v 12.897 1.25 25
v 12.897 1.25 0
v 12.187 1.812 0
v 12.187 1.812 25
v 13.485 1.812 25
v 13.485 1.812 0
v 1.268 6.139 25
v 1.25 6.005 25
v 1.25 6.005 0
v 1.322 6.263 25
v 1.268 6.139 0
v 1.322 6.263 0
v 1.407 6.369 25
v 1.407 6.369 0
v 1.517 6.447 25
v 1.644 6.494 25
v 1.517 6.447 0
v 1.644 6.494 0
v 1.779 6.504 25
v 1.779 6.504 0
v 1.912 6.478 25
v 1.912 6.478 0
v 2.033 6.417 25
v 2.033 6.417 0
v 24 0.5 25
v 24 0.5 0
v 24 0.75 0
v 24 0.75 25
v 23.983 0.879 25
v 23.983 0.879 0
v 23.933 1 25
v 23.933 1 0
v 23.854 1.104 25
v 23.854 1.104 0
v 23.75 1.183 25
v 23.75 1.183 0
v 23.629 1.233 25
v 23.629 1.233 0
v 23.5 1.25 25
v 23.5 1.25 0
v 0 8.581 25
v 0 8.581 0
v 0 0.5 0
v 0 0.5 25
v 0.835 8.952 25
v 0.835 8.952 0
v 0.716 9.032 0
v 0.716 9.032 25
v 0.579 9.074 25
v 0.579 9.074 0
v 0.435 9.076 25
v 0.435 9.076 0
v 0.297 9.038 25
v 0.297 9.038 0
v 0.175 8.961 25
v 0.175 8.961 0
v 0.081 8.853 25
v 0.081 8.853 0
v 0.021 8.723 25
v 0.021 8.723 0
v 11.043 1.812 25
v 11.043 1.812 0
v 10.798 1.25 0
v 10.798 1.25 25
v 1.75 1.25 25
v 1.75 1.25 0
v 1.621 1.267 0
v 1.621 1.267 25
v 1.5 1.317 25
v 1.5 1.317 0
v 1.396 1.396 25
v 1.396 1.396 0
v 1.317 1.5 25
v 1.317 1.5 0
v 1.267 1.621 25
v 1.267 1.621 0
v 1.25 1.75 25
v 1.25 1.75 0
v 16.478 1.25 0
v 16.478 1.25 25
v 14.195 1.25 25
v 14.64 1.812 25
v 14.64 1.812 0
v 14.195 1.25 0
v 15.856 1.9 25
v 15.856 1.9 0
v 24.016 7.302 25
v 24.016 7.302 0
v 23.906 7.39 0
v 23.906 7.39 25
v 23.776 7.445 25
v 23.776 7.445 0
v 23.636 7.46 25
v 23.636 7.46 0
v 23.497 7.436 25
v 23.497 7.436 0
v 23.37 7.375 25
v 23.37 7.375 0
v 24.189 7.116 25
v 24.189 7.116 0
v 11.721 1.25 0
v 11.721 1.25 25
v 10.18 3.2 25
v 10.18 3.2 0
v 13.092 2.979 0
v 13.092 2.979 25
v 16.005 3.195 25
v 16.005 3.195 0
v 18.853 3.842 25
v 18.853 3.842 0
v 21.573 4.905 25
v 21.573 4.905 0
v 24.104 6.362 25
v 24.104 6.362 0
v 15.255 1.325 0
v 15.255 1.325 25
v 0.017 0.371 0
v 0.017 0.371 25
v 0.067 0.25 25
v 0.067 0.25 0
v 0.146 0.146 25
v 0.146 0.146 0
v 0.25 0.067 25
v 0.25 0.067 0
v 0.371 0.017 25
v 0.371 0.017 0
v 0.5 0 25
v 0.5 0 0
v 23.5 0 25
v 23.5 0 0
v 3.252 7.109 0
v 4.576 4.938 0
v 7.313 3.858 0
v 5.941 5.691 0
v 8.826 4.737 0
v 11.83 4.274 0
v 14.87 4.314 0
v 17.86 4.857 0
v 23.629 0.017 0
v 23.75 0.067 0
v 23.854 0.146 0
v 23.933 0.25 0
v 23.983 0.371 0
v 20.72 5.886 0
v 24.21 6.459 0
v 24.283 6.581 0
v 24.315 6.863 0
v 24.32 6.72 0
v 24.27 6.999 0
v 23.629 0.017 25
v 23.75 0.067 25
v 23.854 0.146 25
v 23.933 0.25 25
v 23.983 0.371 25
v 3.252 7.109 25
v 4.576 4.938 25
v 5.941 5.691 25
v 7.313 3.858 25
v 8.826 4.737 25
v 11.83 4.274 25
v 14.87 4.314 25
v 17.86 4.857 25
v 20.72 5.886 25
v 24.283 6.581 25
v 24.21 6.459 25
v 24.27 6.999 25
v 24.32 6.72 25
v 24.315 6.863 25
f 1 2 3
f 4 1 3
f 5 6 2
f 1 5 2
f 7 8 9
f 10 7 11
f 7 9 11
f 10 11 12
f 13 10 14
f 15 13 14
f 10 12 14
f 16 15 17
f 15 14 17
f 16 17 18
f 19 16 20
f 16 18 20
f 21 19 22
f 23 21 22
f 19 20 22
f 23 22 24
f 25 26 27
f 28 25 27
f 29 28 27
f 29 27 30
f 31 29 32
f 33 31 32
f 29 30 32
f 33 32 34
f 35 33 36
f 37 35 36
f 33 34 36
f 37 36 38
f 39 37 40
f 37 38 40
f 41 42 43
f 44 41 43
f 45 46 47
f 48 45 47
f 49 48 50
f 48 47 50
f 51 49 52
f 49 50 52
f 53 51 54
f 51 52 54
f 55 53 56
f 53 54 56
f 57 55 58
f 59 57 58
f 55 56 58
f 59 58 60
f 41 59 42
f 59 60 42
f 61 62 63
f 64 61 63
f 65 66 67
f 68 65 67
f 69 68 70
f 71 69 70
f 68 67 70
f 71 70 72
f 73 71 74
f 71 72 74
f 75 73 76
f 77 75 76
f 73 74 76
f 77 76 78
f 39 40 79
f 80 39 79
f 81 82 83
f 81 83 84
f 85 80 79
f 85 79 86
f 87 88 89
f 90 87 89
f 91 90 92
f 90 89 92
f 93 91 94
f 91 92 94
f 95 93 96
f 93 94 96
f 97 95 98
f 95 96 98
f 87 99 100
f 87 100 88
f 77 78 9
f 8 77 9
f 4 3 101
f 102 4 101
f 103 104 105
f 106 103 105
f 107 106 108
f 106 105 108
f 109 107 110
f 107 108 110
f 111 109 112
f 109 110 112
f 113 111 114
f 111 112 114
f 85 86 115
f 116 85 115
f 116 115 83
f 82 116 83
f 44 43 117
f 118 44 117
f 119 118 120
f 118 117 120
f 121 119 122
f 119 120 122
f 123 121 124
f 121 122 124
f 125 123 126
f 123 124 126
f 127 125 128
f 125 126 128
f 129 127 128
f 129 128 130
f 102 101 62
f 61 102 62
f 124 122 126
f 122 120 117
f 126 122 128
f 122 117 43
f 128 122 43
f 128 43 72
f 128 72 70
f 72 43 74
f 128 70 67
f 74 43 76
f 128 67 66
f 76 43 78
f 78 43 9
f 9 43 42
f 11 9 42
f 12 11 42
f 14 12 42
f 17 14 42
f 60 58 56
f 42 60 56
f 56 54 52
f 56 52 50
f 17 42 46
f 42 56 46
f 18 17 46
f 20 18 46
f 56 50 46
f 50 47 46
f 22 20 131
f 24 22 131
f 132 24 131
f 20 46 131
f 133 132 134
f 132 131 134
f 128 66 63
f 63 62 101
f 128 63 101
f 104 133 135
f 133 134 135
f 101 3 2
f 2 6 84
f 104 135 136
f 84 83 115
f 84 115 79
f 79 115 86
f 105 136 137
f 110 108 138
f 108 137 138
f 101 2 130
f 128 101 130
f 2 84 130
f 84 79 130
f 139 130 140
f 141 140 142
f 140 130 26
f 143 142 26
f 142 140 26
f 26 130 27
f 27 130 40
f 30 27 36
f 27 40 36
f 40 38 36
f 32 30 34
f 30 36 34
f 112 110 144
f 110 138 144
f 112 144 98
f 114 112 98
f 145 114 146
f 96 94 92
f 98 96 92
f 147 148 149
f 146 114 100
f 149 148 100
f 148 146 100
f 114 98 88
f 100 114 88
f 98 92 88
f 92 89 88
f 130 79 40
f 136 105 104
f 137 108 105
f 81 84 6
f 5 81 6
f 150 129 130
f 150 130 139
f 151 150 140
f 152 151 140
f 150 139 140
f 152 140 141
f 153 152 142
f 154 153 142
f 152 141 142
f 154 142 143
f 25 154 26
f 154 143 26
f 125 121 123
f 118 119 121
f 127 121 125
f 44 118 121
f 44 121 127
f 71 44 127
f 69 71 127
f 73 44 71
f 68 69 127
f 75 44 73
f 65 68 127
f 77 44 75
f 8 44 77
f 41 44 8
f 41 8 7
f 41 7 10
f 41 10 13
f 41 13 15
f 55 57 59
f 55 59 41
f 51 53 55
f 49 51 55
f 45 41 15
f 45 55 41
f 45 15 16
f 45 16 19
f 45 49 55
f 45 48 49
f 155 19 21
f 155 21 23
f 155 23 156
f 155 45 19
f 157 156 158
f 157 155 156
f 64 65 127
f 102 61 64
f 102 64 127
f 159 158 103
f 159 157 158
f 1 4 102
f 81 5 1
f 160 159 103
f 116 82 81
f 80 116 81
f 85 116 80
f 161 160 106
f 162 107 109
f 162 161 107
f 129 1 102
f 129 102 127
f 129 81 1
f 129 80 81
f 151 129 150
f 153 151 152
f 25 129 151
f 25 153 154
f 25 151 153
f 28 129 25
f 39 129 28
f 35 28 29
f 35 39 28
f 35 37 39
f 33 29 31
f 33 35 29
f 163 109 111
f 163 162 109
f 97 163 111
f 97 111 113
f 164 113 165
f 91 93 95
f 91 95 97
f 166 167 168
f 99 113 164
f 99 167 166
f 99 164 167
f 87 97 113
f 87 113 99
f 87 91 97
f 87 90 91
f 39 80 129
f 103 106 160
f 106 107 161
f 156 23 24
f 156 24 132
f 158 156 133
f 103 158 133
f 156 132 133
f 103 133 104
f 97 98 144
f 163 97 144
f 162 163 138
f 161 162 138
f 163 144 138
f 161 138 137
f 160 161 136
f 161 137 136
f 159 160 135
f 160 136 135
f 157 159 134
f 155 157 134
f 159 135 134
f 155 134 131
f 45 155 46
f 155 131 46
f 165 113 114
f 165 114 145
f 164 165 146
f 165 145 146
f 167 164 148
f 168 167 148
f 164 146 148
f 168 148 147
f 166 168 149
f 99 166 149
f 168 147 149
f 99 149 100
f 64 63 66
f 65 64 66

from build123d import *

# Parameters (mm, degrees)
SALIENTE_EXTRUIR1_DEPTH = 25


with BuildPart() as part:
    # Croquis1 → Saliente-Extruir1 (new body)
    with BuildSketch(Plane.XY):
        with BuildLine():
            Line((0.5, 0), (23.5, 0))
            ThreePointArc((23.5, 0), (23.853553391, 0.146446609), (24, 0.5))
            Line((24, 0.5), (24, 0.75))
            ThreePointArc((24, 0.75), (23.853553391, 1.103553391), (23.5, 1.25))
            Line((23.5, 1.25), (16.47782129, 1.25))
            Line((16.47782129, 1.25), (15.856313475, 1.900076822))
            Line((15.856313475, 1.900076822), (15.255148566, 1.325331382))
            Line((15.255148566, 1.325331382), (14.640350544, 1.812303006))
            Line((14.640350544, 1.812303006), (14.194959378, 1.25))
            Line((14.194959378, 1.25), (13.485056051, 1.812303006))
            Line((13.485056051, 1.812303006), (12.896905521, 1.25))
            Line((12.896905521, 1.25), (12.187002195, 1.812303006))
            Line((12.187002195, 1.812303006), (11.72060446, 1.25))
            Line((11.72060446, 1.25), (11.042675201, 1.812303006))
            Line((11.042675201, 1.812303006), (10.797993302, 1.25))
            Line((10.797993302, 1.25), (1.75, 1.25))
            ThreePointArc((1.75, 1.25), (1.396446609, 1.396446609), (1.25, 1.75))
            Line((1.25, 1.75), (1.25, 6.004934433))
            ThreePointArc((1.25, 6.004934433), (1.517138688, 6.44739981), (2.033102437, 6.417066706))
            ThreePointArc((2.033102437, 6.417066706), (5.924204231, 4.346635928), (10.180078199, 3.199947857))
            ThreePointArc((10.180078199, 3.199947857), (17.440764487, 3.465174135), (24.103823344, 6.361992565))
            ThreePointArc((24.103823344, 6.361992565), (24.319661393, 6.719764128), (24.188505071, 7.116481375))
            Line((24.188505071, 7.116481375), (24.015976281, 7.301546958))
            ThreePointArc((24.015976281, 7.301546958), (23.706531625, 7.457420718), (23.370061121, 7.374715069))
            ThreePointArc((23.370061121, 7.374715069), (11.830432965, 4.274140818), (0.835139338, 8.951757379))
            ThreePointArc((0.835139338, 8.951757379), (0.296984814, 9.037632425), (0, 8.580702634))
            Line((0, 8.580702634), (0, 0.5))
            ThreePointArc((0, 0.5), (0.146446609, 0.146446609), (0.5, 0))
        make_face()
    extrude(amount=SALIENTE_EXTRUIR1_DEPTH)


solid = part.part
